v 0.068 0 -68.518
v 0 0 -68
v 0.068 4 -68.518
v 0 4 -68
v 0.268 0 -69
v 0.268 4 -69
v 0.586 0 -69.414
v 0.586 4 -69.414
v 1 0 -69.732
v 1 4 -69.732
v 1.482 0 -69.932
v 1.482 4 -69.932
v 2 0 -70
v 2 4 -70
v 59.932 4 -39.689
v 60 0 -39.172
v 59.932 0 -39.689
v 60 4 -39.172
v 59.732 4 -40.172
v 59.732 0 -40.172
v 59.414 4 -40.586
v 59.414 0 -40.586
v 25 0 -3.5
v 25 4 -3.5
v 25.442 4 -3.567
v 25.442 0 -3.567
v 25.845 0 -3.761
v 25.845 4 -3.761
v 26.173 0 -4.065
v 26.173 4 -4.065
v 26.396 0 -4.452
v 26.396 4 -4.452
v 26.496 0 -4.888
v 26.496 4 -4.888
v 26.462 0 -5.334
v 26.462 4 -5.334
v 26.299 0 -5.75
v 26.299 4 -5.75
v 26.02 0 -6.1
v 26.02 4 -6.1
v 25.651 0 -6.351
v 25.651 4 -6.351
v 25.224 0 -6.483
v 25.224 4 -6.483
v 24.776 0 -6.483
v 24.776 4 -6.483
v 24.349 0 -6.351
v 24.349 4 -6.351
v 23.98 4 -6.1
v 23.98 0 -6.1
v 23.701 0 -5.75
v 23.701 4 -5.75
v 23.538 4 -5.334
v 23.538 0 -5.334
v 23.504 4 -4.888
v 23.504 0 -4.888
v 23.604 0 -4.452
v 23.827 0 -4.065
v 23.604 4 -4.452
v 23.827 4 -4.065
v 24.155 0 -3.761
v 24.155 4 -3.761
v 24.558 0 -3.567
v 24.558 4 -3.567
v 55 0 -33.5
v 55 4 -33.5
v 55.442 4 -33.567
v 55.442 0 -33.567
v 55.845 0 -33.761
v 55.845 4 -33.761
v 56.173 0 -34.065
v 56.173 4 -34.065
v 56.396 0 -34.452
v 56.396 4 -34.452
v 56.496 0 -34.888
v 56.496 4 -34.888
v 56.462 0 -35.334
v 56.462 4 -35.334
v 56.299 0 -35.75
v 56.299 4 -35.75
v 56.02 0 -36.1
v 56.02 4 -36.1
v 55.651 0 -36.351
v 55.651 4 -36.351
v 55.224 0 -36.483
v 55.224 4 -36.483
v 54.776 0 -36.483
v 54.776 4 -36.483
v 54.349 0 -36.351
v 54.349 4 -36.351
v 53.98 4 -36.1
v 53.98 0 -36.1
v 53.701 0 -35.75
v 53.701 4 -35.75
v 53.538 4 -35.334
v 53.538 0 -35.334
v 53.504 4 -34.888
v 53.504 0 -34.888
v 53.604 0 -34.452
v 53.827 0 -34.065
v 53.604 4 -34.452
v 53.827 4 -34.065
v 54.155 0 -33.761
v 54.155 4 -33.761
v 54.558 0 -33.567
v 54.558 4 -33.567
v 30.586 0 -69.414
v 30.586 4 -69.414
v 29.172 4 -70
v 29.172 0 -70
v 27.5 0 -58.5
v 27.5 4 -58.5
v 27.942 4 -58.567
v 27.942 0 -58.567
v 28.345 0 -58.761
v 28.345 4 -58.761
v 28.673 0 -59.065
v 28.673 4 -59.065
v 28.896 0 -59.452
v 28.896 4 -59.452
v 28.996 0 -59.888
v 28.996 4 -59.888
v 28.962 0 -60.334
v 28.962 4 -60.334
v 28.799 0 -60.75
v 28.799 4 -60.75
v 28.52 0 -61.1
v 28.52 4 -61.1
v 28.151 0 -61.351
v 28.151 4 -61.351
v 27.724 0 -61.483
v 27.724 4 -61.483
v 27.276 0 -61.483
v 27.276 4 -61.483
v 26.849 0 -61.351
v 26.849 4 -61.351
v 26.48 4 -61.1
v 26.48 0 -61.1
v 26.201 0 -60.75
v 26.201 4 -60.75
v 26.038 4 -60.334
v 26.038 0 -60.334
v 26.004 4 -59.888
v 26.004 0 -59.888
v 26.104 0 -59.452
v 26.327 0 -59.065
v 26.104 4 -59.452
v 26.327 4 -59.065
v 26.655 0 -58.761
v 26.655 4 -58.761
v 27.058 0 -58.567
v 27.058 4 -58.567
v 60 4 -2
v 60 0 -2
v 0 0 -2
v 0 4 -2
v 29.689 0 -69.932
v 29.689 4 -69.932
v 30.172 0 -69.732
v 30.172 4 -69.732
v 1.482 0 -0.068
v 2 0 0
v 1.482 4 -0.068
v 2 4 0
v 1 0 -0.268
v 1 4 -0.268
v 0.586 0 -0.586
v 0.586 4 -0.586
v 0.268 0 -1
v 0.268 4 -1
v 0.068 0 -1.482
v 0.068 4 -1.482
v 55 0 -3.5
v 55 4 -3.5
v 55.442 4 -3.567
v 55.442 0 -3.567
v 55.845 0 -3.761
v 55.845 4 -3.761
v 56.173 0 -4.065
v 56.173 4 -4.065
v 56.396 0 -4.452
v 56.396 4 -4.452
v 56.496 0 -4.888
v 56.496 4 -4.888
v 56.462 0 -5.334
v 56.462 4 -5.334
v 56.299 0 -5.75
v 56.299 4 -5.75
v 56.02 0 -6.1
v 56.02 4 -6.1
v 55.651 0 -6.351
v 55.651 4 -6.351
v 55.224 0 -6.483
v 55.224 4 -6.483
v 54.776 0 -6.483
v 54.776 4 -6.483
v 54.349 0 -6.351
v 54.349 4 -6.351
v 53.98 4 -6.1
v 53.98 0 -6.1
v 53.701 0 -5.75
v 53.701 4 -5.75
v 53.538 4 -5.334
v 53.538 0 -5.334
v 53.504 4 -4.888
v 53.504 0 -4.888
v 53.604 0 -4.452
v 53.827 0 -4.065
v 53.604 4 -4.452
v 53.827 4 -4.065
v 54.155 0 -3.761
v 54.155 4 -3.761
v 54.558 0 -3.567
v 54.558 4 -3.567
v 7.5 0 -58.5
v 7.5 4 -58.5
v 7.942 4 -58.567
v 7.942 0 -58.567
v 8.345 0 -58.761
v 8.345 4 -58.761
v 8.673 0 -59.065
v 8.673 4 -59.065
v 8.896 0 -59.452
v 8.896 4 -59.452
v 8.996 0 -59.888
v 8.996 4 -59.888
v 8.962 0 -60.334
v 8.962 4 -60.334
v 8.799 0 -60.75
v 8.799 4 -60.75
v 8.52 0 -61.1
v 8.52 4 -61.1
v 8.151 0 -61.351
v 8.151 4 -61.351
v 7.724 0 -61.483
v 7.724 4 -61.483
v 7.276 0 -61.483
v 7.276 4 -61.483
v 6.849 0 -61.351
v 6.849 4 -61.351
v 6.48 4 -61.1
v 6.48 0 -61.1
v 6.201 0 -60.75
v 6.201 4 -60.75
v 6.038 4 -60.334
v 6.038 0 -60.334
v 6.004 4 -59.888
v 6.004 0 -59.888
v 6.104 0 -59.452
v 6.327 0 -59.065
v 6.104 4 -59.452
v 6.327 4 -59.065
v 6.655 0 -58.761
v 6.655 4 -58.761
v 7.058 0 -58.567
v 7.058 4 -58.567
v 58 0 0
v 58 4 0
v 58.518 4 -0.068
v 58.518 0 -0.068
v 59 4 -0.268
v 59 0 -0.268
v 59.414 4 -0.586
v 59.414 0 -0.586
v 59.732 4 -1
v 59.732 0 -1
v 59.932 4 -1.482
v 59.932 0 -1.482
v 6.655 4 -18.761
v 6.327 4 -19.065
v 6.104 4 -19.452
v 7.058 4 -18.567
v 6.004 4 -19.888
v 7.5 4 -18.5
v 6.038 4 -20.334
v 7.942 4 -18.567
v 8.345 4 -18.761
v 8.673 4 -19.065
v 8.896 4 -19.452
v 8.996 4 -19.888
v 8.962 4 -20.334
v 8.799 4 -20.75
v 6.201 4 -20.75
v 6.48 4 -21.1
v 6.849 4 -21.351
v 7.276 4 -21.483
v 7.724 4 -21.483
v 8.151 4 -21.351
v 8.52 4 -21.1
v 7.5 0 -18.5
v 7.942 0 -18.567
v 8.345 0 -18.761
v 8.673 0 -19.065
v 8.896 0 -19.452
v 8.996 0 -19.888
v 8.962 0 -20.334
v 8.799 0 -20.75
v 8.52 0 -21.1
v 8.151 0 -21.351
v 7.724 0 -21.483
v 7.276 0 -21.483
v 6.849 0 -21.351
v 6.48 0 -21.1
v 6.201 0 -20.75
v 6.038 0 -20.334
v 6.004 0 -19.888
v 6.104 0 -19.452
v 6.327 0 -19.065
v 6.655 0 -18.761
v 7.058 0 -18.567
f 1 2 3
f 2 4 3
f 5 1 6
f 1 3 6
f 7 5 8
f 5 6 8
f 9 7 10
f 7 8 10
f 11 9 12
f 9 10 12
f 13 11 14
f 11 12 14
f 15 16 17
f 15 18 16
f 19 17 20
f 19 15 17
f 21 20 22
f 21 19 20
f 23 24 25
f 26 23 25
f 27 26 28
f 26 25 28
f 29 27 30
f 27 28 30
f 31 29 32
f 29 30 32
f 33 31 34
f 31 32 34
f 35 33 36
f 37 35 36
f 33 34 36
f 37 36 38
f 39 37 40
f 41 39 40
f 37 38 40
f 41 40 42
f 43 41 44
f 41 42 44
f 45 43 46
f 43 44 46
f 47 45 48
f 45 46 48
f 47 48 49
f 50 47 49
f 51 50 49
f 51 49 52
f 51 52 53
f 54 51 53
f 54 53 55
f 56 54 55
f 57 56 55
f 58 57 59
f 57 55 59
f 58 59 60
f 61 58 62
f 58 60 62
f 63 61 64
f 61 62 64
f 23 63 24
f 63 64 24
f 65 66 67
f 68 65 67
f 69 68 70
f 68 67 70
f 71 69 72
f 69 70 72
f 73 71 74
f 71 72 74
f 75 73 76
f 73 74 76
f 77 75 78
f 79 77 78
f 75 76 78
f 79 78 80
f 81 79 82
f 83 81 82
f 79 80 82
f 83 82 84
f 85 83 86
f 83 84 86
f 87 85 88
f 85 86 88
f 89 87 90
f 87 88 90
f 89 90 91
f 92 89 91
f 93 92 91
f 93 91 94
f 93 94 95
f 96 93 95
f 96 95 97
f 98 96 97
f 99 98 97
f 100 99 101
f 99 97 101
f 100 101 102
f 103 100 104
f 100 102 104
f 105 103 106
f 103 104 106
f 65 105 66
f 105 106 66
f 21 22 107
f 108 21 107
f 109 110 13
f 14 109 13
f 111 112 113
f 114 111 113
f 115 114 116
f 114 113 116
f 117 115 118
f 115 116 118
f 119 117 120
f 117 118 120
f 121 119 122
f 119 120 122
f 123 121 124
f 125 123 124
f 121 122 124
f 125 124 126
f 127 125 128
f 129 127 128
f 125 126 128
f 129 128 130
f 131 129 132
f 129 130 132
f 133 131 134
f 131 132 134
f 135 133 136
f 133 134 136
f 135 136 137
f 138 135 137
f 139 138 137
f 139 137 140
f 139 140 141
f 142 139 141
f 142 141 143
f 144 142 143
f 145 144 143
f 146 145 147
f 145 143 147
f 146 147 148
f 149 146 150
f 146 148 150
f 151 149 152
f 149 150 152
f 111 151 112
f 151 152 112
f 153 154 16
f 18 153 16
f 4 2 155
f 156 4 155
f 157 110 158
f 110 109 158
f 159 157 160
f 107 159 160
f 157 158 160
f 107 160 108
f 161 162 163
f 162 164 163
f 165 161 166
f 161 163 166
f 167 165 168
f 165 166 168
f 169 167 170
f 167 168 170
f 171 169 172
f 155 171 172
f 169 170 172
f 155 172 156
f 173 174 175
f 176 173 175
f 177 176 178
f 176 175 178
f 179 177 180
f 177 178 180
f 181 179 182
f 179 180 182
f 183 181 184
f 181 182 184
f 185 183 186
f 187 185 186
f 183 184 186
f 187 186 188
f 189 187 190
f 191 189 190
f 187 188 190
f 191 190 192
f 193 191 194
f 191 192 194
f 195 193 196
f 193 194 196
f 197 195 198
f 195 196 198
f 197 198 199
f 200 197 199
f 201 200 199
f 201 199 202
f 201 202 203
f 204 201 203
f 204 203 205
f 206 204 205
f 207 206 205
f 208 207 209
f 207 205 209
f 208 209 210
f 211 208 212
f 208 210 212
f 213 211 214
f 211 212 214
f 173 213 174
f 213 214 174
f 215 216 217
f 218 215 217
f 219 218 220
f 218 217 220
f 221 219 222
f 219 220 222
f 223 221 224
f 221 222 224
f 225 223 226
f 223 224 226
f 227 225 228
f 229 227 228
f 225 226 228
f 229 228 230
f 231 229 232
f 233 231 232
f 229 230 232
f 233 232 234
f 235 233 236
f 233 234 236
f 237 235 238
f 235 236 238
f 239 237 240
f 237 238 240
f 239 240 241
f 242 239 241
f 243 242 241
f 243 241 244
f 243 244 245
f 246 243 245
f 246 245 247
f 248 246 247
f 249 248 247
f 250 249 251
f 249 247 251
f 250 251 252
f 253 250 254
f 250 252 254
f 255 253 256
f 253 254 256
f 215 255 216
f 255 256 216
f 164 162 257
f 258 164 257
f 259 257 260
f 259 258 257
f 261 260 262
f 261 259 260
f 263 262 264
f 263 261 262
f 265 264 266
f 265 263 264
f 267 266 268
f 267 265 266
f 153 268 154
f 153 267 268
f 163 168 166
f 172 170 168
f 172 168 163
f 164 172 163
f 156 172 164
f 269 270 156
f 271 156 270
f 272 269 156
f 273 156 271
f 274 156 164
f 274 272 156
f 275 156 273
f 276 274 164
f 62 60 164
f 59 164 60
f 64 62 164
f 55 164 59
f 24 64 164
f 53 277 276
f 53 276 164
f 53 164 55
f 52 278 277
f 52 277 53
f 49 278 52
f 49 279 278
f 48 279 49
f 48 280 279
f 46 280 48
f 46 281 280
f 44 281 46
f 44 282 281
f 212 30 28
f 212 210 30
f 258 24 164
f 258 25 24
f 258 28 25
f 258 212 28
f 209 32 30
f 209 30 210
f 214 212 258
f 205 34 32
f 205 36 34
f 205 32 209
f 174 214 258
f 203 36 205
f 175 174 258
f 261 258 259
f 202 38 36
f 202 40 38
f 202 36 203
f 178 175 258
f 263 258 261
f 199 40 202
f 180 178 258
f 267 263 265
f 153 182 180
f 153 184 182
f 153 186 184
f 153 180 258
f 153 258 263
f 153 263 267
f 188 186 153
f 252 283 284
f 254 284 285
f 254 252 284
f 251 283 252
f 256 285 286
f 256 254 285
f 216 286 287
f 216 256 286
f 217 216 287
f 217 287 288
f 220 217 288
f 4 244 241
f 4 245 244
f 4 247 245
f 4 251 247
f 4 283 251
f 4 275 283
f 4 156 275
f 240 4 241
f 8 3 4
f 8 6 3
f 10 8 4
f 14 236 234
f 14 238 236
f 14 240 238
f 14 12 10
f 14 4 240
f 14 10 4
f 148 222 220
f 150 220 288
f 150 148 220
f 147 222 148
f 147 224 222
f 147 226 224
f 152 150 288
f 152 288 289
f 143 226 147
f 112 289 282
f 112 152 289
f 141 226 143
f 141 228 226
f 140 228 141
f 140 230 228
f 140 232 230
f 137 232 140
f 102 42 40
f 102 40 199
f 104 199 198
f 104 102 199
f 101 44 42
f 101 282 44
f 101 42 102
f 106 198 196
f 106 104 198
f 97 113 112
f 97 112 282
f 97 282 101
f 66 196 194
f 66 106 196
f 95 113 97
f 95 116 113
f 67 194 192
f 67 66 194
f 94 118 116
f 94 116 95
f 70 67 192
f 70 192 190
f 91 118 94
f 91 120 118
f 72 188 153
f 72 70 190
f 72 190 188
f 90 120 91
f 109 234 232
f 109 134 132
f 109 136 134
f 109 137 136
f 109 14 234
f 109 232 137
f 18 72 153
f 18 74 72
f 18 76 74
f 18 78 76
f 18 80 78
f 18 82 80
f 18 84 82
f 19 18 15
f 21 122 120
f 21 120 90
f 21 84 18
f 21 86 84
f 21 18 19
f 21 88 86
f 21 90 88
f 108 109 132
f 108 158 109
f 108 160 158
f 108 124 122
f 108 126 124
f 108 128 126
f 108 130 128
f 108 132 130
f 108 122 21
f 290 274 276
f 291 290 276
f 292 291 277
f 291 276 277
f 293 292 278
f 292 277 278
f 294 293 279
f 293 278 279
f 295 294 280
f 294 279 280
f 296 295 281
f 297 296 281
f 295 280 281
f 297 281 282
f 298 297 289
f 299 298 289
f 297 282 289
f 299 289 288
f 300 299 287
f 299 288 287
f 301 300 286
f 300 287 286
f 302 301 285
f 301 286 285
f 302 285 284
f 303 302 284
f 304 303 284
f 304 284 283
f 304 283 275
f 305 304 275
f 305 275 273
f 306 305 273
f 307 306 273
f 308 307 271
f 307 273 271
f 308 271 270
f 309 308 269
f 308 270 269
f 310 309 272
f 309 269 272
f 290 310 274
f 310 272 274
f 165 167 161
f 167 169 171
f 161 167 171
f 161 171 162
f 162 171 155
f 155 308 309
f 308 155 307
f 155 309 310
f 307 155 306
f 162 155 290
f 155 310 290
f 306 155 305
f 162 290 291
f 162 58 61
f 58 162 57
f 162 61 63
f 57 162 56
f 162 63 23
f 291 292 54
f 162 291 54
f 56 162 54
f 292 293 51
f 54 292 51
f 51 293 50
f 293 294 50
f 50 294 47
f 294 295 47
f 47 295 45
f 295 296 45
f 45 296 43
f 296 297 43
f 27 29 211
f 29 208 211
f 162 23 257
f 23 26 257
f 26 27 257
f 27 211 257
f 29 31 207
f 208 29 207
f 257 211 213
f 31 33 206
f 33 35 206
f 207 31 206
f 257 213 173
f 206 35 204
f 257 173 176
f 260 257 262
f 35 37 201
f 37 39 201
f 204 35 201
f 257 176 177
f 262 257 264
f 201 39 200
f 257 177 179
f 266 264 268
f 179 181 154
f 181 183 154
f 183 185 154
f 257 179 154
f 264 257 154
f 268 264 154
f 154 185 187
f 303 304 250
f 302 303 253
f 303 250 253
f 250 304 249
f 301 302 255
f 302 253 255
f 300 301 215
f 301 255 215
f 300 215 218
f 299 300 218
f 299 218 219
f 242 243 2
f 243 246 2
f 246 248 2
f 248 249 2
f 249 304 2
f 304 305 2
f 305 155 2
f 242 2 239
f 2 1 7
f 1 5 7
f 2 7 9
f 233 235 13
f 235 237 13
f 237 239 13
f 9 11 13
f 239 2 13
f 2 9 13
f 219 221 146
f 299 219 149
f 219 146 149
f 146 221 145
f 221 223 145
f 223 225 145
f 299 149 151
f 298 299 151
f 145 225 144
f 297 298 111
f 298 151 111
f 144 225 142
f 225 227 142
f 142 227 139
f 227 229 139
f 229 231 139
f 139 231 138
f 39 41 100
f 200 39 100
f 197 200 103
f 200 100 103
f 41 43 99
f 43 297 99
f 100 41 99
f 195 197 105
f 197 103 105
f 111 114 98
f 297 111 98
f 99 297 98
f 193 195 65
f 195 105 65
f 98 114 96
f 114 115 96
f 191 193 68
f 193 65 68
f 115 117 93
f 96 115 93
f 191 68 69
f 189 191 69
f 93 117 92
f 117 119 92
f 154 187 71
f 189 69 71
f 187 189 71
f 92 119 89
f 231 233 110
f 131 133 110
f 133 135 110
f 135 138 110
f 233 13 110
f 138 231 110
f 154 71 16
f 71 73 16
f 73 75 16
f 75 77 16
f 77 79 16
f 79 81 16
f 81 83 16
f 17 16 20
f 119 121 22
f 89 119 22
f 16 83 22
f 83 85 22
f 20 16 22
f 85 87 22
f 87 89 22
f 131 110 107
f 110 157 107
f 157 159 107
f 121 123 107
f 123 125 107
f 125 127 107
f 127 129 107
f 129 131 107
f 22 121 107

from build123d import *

# Parameters (mm, degrees)
EXTRUDE_1_DEPTH     = 4
SKETCH_2_R          = 1.5
CUT_EXTRUDE_1_DEPTH = 4
FILLET_1_R          = 2
SKETCH_3_R          = 1.5
CUT_EXTRUDE_2_DEPTH = 4
SKETCH_4_R          = 1.5
CUT_EXTRUDE_3_DEPTH = 4
SKETCH_5_R          = 1.5
CUT_EXTRUDE_4_DEPTH = 4
SKETCH_6_R          = 1.5
CUT_EXTRUDE_5_DEPTH = 4


with BuildPart() as part:
    # 草图1 → 凸台-拉伸1 (new body)
    with BuildSketch(Plane(origin=(0, 0, 0), x_dir=(1, 0, 0), z_dir=(0, 1, 0))):
        Polygon((0, 0), (60, 0), (60, 40), (30, 70), (0, 70), align=None)
    extrude(amount=EXTRUDE_1_DEPTH)

    # 草图2 → 切除-拉伸1 (cut)
    with BuildSketch(Plane(origin=(0, 4, 0), x_dir=(1, 0, 0), z_dir=(0, 1, 0))):
        with Locations(Location((7.5, 20, 0), (0, 0, 270))):
            Circle(SKETCH_2_R)
        with Locations(Location((7.5, 60, 0), (0, 0, 270))):
            Circle(SKETCH_2_R)
    extrude(amount=-CUT_EXTRUDE_1_DEPTH, mode=Mode.SUBTRACT)

    # 圆角1
    fillet_1_edges = [part.edges().sort_by_distance(p)[0] for p in [
        (0, 2, -70),
        (30, 2, -70),
        (60, 2, -40),
        (60, 2, 0),
        (0, 2, 0),
    ]]
    fillet(fillet_1_edges, radius=FILLET_1_R)

    # 草图3 → 切除-拉伸2 (cut)
    with BuildSketch(Plane(origin=(0, 4, 0), x_dir=(1, 0, 0), z_dir=(0, 1, 0))):
        with Locations(Location((55, 5, 0), (0, 0, 270))):
            Circle(SKETCH_3_R)
    extrude(amount=-CUT_EXTRUDE_2_DEPTH, mode=Mode.SUBTRACT)

    # 草图4 → 切除-拉伸3 (cut)
    with BuildSketch(Plane(origin=(0, 4, 0), x_dir=(1, 0, 0), z_dir=(0, 1, 0))):
        with Locations(Location((27.5, 60, 0), (0, 0, 270))):
            Circle(SKETCH_4_R)
    extrude(amount=-CUT_EXTRUDE_3_DEPTH, mode=Mode.SUBTRACT)

    # 草图5 → 切除-拉伸4 (cut)
    with BuildSketch(Plane(origin=(0, 4, 0), x_dir=(1, 0, 0), z_dir=(0, 1, 0))):
        with Locations(Location((25, 5, 0), (0, 0, 270))):
            Circle(SKETCH_5_R)
    extrude(amount=-CUT_EXTRUDE_4_DEPTH, mode=Mode.SUBTRACT)

    # 草图6 → 切除-拉伸5 (cut)
    with BuildSketch(Plane(origin=(0, 4, 0), x_dir=(1, 0, 0), z_dir=(0, 1, 0))):
        with Locations(Location((55, 35, 0), (0, 0, 270))):
            Circle(SKETCH_6_R)
    extrude(amount=-CUT_EXTRUDE_5_DEPTH, mode=Mode.SUBTRACT)


solid = part.part
